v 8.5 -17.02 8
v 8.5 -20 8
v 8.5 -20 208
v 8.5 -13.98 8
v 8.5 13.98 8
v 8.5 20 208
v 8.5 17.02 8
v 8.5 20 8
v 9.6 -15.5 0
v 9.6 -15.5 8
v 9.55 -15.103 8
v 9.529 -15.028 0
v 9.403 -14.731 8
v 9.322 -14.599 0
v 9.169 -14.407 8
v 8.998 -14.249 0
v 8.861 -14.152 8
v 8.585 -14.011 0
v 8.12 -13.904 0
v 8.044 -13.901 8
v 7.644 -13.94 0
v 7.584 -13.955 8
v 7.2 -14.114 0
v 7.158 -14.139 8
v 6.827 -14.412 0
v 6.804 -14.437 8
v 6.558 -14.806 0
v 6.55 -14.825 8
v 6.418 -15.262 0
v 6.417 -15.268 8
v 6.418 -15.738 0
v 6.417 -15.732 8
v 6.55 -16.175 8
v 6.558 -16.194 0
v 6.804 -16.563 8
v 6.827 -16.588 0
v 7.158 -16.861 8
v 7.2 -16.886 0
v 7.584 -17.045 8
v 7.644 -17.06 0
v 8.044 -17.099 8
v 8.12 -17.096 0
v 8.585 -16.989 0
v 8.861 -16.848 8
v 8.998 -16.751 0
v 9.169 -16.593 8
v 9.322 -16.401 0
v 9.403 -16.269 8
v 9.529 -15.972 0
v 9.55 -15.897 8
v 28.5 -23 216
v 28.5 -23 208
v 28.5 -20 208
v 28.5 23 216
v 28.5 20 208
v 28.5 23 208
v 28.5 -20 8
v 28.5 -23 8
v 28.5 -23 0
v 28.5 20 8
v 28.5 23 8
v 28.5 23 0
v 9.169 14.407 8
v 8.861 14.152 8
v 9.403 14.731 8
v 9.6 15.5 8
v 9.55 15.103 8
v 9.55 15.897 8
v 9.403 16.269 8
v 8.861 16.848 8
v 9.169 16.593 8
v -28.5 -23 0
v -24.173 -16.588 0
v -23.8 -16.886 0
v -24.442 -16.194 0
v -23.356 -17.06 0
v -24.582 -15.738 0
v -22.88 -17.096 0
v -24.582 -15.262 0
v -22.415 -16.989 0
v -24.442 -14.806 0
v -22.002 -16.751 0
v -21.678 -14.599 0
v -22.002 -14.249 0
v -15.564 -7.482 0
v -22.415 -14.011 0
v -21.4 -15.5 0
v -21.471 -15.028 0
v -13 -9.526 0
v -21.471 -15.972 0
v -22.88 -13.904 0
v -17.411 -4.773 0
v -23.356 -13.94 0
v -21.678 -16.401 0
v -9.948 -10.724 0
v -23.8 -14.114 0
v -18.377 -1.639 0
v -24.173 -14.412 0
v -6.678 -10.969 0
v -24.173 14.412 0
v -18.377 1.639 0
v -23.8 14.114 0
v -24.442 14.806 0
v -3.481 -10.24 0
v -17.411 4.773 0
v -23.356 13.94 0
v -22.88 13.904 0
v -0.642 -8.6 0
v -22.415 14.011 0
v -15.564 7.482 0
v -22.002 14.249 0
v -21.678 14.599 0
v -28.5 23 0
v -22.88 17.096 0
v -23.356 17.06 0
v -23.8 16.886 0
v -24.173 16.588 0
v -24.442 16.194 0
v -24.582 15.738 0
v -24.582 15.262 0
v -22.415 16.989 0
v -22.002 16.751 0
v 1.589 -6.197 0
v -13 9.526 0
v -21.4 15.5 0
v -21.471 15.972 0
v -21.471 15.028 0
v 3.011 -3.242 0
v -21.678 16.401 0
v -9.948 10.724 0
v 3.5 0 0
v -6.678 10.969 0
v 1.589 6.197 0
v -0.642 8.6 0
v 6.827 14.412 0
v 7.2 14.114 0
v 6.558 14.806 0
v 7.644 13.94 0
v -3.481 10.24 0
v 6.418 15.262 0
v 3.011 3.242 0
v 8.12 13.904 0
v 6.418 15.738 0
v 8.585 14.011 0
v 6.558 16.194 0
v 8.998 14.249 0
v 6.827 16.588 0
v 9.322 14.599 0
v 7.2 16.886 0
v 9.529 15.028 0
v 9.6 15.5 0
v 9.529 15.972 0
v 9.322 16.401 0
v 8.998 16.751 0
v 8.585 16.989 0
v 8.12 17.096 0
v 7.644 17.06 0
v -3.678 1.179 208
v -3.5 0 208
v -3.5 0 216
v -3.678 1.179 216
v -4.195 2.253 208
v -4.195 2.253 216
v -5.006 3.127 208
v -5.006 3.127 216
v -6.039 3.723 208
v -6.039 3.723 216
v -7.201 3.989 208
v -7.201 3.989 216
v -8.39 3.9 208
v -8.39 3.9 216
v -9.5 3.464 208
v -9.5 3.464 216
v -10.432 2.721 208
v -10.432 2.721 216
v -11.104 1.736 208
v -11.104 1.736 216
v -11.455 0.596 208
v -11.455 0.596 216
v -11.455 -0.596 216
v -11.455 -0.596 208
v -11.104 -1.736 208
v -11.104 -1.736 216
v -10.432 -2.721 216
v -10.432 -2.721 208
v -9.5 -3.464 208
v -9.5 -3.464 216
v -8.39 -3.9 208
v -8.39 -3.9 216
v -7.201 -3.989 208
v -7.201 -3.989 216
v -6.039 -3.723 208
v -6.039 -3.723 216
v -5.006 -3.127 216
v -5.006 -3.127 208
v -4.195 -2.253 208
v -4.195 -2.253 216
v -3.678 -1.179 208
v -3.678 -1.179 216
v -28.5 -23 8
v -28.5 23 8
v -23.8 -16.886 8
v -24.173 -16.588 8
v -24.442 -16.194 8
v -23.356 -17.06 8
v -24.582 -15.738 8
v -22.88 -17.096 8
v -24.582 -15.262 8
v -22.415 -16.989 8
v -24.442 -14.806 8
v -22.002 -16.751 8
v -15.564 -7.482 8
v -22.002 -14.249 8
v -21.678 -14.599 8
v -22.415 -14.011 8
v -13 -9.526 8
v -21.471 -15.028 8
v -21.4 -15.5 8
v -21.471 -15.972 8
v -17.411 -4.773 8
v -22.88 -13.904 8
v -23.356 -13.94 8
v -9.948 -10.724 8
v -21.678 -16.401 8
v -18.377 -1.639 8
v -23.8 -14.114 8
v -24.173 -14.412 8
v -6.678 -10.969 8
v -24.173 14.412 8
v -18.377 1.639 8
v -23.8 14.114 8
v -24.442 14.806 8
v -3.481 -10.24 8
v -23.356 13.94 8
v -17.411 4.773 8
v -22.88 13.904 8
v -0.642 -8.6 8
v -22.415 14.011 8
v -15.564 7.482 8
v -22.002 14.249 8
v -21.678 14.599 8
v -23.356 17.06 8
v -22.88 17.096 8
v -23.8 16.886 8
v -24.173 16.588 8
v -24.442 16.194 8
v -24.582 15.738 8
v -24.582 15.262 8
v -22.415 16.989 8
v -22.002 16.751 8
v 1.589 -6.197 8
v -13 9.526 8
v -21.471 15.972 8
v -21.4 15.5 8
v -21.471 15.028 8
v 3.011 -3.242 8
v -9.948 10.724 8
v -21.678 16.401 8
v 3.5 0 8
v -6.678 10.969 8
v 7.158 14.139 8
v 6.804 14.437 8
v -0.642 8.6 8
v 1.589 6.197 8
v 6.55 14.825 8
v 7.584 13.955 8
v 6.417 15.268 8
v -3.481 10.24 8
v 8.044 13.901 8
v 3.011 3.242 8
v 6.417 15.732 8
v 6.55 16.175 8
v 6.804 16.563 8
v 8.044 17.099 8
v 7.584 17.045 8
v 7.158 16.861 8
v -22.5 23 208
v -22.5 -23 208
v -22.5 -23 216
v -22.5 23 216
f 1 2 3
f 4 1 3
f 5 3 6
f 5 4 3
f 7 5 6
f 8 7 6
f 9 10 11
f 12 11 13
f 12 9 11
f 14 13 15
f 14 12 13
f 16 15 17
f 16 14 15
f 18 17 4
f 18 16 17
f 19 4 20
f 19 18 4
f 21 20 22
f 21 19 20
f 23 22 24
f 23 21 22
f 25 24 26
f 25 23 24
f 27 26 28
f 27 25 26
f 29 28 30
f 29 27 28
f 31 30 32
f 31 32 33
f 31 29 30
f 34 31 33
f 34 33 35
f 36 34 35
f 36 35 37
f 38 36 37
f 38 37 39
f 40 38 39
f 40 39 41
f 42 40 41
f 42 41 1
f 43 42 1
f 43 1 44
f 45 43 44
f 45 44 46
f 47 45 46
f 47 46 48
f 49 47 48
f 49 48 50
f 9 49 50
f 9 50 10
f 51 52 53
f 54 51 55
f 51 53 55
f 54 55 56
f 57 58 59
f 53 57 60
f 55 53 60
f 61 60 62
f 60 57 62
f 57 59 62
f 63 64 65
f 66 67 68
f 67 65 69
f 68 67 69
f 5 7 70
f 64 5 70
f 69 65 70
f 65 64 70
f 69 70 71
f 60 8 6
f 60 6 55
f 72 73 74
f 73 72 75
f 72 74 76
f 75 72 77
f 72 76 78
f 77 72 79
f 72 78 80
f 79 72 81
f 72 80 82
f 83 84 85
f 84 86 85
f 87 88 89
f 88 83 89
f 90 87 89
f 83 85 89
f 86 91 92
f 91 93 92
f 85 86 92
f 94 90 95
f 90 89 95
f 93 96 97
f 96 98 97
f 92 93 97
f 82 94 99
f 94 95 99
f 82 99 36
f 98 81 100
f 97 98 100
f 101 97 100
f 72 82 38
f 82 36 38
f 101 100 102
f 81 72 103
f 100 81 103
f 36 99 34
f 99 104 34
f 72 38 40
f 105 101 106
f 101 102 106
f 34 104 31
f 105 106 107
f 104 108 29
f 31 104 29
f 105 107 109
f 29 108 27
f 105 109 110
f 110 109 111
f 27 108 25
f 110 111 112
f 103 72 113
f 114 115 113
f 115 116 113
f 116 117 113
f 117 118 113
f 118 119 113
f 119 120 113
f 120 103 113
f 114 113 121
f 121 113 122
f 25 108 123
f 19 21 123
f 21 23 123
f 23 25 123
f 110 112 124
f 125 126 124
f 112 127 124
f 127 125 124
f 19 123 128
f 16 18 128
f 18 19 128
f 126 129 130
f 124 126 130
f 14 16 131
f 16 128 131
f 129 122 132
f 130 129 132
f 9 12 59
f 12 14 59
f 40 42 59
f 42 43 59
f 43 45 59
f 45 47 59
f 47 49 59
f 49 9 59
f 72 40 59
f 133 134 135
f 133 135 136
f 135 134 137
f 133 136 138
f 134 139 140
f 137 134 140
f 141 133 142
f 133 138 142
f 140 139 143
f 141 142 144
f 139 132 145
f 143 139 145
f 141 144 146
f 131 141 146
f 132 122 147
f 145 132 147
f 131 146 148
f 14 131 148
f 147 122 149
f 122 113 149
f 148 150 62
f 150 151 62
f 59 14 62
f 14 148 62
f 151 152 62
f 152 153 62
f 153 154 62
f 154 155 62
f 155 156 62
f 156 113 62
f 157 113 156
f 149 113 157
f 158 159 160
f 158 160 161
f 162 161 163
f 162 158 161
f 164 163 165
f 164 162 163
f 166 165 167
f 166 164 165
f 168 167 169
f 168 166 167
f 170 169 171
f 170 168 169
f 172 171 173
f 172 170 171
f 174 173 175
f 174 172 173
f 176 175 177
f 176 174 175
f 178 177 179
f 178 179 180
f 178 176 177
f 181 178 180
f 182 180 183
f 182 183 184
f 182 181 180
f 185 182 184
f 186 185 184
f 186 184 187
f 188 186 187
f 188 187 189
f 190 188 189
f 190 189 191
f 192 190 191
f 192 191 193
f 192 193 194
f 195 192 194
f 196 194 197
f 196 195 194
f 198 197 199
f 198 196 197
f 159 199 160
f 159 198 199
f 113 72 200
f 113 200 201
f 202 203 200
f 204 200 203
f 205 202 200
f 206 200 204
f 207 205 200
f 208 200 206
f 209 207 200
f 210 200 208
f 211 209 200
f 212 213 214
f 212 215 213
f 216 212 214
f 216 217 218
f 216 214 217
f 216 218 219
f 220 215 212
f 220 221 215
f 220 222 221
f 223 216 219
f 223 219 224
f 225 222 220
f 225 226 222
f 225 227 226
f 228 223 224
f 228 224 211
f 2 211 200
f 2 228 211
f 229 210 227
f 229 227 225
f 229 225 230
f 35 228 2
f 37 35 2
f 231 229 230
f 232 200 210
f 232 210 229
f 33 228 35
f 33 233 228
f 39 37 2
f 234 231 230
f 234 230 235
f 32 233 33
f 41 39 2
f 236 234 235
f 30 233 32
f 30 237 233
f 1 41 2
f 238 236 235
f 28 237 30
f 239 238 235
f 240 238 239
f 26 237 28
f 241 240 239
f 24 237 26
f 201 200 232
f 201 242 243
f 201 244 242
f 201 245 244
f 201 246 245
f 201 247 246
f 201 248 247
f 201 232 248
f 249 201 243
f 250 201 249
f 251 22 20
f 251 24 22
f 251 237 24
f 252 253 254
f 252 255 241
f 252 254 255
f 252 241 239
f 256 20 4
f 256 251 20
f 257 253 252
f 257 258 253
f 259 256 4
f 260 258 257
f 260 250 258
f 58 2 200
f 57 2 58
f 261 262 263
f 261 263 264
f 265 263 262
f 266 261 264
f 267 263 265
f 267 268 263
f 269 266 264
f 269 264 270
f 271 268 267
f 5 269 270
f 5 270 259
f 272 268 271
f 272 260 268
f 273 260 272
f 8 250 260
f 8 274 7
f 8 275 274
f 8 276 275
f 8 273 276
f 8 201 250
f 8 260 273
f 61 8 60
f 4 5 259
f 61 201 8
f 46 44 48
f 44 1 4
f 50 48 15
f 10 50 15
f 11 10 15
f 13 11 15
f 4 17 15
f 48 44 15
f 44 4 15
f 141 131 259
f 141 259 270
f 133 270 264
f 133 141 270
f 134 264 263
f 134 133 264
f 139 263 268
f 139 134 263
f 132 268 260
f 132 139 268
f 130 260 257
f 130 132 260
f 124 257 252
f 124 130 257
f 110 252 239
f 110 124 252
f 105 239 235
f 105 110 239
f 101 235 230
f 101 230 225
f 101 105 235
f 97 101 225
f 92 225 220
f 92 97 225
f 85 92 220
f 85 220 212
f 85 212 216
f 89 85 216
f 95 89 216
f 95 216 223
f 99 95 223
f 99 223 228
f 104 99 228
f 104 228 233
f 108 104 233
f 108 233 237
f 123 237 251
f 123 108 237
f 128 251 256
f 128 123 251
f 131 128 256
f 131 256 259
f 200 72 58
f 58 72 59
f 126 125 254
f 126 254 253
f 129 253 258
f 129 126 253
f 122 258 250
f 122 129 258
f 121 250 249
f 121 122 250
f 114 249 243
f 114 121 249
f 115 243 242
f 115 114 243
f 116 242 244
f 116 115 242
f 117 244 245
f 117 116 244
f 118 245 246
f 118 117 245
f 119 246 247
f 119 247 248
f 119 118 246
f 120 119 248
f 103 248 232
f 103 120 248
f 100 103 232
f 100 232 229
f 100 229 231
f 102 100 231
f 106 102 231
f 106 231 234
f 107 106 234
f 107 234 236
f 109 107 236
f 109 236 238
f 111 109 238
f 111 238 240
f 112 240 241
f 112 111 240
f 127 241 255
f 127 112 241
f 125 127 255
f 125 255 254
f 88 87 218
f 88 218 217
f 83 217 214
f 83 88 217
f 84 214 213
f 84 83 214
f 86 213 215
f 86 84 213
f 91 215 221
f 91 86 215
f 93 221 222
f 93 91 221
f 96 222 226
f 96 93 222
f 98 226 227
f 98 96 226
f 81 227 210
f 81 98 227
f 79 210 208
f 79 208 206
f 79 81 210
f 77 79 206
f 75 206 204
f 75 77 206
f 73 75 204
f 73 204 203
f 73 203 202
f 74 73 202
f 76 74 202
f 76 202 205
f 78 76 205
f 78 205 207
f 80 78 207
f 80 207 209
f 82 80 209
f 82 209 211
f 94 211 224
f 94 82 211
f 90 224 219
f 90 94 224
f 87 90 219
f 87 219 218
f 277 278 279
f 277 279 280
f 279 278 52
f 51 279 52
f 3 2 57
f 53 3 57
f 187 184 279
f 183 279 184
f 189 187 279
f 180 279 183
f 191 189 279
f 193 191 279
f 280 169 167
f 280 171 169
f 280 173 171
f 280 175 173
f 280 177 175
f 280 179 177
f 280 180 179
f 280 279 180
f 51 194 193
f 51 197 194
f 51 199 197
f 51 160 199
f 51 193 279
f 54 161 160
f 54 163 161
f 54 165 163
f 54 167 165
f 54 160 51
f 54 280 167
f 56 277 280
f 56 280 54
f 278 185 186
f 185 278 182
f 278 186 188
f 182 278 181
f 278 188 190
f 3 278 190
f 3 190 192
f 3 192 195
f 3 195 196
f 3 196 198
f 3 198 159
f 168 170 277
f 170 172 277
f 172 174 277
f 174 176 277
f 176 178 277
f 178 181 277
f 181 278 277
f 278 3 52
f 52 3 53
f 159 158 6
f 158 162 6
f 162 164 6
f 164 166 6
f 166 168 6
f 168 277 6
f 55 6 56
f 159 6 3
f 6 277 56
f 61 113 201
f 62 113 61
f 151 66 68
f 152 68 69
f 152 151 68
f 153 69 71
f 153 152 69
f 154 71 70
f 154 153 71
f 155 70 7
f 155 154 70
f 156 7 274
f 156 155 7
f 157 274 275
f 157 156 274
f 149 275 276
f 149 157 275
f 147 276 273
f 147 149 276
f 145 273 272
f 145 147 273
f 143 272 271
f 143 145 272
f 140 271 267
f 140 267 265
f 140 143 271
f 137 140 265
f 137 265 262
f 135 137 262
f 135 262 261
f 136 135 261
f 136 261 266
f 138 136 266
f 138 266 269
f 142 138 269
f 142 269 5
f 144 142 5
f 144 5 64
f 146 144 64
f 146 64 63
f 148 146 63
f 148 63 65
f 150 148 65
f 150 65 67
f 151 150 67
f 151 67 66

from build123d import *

# Parameters (mm, degrees)
SKETCH_1_W      = 57
SKETCH_1_H      = 46
SKETCH_1_R      = 11
SKETCH_1_R_2    = 1.6
EXTRUDE_1_DEPTH = 8
SKETCH_2_W      = 20
SKETCH_2_H      = 40
EXTRUDE_2_DEPTH = 200
SKETCH_3_W      = 51
SKETCH_3_H      = 46
SKETCH_3_R      = 4
EXTRUDE_3_DEPTH = 8


with BuildPart() as part:
    # 草图1 → 凸台-拉伸1 (new body)
    with BuildSketch(Plane.XY):
        Rectangle(SKETCH_1_W, SKETCH_1_H)
        with Locations((-7.5, 0)):
            Circle(SKETCH_1_R, mode=Mode.SUBTRACT)
        with Locations((-23, 15.5)):
            Circle(SKETCH_1_R_2, mode=Mode.SUBTRACT)
        with Locations((8, 15.5)):
            Circle(SKETCH_1_R_2, mode=Mode.SUBTRACT)
        with Locations((8, -15.5)):
            Circle(SKETCH_1_R_2, mode=Mode.SUBTRACT)
        with Locations((-23, -15.5)):
            Circle(SKETCH_1_R_2, mode=Mode.SUBTRACT)
    extrude(amount=EXTRUDE_1_DEPTH)

    # 草图2 → 凸台-拉伸2 (add)
    with BuildSketch(Plane.XY.offset(8)):
        with Locations((18.5, 0)):
            Rectangle(SKETCH_2_W, SKETCH_2_H)
    extrude(amount=EXTRUDE_2_DEPTH)

    # 草图3 → 凸台-拉伸3 (add)
    with BuildSketch(Plane.XY.offset(208)):
        with Locations((3, 0)):
            Rectangle(SKETCH_3_W, SKETCH_3_H)
        with Locations((-7.5, 0)):
            Circle(SKETCH_3_R, mode=Mode.SUBTRACT)
    extrude(amount=EXTRUDE_3_DEPTH)


solid = part.part
